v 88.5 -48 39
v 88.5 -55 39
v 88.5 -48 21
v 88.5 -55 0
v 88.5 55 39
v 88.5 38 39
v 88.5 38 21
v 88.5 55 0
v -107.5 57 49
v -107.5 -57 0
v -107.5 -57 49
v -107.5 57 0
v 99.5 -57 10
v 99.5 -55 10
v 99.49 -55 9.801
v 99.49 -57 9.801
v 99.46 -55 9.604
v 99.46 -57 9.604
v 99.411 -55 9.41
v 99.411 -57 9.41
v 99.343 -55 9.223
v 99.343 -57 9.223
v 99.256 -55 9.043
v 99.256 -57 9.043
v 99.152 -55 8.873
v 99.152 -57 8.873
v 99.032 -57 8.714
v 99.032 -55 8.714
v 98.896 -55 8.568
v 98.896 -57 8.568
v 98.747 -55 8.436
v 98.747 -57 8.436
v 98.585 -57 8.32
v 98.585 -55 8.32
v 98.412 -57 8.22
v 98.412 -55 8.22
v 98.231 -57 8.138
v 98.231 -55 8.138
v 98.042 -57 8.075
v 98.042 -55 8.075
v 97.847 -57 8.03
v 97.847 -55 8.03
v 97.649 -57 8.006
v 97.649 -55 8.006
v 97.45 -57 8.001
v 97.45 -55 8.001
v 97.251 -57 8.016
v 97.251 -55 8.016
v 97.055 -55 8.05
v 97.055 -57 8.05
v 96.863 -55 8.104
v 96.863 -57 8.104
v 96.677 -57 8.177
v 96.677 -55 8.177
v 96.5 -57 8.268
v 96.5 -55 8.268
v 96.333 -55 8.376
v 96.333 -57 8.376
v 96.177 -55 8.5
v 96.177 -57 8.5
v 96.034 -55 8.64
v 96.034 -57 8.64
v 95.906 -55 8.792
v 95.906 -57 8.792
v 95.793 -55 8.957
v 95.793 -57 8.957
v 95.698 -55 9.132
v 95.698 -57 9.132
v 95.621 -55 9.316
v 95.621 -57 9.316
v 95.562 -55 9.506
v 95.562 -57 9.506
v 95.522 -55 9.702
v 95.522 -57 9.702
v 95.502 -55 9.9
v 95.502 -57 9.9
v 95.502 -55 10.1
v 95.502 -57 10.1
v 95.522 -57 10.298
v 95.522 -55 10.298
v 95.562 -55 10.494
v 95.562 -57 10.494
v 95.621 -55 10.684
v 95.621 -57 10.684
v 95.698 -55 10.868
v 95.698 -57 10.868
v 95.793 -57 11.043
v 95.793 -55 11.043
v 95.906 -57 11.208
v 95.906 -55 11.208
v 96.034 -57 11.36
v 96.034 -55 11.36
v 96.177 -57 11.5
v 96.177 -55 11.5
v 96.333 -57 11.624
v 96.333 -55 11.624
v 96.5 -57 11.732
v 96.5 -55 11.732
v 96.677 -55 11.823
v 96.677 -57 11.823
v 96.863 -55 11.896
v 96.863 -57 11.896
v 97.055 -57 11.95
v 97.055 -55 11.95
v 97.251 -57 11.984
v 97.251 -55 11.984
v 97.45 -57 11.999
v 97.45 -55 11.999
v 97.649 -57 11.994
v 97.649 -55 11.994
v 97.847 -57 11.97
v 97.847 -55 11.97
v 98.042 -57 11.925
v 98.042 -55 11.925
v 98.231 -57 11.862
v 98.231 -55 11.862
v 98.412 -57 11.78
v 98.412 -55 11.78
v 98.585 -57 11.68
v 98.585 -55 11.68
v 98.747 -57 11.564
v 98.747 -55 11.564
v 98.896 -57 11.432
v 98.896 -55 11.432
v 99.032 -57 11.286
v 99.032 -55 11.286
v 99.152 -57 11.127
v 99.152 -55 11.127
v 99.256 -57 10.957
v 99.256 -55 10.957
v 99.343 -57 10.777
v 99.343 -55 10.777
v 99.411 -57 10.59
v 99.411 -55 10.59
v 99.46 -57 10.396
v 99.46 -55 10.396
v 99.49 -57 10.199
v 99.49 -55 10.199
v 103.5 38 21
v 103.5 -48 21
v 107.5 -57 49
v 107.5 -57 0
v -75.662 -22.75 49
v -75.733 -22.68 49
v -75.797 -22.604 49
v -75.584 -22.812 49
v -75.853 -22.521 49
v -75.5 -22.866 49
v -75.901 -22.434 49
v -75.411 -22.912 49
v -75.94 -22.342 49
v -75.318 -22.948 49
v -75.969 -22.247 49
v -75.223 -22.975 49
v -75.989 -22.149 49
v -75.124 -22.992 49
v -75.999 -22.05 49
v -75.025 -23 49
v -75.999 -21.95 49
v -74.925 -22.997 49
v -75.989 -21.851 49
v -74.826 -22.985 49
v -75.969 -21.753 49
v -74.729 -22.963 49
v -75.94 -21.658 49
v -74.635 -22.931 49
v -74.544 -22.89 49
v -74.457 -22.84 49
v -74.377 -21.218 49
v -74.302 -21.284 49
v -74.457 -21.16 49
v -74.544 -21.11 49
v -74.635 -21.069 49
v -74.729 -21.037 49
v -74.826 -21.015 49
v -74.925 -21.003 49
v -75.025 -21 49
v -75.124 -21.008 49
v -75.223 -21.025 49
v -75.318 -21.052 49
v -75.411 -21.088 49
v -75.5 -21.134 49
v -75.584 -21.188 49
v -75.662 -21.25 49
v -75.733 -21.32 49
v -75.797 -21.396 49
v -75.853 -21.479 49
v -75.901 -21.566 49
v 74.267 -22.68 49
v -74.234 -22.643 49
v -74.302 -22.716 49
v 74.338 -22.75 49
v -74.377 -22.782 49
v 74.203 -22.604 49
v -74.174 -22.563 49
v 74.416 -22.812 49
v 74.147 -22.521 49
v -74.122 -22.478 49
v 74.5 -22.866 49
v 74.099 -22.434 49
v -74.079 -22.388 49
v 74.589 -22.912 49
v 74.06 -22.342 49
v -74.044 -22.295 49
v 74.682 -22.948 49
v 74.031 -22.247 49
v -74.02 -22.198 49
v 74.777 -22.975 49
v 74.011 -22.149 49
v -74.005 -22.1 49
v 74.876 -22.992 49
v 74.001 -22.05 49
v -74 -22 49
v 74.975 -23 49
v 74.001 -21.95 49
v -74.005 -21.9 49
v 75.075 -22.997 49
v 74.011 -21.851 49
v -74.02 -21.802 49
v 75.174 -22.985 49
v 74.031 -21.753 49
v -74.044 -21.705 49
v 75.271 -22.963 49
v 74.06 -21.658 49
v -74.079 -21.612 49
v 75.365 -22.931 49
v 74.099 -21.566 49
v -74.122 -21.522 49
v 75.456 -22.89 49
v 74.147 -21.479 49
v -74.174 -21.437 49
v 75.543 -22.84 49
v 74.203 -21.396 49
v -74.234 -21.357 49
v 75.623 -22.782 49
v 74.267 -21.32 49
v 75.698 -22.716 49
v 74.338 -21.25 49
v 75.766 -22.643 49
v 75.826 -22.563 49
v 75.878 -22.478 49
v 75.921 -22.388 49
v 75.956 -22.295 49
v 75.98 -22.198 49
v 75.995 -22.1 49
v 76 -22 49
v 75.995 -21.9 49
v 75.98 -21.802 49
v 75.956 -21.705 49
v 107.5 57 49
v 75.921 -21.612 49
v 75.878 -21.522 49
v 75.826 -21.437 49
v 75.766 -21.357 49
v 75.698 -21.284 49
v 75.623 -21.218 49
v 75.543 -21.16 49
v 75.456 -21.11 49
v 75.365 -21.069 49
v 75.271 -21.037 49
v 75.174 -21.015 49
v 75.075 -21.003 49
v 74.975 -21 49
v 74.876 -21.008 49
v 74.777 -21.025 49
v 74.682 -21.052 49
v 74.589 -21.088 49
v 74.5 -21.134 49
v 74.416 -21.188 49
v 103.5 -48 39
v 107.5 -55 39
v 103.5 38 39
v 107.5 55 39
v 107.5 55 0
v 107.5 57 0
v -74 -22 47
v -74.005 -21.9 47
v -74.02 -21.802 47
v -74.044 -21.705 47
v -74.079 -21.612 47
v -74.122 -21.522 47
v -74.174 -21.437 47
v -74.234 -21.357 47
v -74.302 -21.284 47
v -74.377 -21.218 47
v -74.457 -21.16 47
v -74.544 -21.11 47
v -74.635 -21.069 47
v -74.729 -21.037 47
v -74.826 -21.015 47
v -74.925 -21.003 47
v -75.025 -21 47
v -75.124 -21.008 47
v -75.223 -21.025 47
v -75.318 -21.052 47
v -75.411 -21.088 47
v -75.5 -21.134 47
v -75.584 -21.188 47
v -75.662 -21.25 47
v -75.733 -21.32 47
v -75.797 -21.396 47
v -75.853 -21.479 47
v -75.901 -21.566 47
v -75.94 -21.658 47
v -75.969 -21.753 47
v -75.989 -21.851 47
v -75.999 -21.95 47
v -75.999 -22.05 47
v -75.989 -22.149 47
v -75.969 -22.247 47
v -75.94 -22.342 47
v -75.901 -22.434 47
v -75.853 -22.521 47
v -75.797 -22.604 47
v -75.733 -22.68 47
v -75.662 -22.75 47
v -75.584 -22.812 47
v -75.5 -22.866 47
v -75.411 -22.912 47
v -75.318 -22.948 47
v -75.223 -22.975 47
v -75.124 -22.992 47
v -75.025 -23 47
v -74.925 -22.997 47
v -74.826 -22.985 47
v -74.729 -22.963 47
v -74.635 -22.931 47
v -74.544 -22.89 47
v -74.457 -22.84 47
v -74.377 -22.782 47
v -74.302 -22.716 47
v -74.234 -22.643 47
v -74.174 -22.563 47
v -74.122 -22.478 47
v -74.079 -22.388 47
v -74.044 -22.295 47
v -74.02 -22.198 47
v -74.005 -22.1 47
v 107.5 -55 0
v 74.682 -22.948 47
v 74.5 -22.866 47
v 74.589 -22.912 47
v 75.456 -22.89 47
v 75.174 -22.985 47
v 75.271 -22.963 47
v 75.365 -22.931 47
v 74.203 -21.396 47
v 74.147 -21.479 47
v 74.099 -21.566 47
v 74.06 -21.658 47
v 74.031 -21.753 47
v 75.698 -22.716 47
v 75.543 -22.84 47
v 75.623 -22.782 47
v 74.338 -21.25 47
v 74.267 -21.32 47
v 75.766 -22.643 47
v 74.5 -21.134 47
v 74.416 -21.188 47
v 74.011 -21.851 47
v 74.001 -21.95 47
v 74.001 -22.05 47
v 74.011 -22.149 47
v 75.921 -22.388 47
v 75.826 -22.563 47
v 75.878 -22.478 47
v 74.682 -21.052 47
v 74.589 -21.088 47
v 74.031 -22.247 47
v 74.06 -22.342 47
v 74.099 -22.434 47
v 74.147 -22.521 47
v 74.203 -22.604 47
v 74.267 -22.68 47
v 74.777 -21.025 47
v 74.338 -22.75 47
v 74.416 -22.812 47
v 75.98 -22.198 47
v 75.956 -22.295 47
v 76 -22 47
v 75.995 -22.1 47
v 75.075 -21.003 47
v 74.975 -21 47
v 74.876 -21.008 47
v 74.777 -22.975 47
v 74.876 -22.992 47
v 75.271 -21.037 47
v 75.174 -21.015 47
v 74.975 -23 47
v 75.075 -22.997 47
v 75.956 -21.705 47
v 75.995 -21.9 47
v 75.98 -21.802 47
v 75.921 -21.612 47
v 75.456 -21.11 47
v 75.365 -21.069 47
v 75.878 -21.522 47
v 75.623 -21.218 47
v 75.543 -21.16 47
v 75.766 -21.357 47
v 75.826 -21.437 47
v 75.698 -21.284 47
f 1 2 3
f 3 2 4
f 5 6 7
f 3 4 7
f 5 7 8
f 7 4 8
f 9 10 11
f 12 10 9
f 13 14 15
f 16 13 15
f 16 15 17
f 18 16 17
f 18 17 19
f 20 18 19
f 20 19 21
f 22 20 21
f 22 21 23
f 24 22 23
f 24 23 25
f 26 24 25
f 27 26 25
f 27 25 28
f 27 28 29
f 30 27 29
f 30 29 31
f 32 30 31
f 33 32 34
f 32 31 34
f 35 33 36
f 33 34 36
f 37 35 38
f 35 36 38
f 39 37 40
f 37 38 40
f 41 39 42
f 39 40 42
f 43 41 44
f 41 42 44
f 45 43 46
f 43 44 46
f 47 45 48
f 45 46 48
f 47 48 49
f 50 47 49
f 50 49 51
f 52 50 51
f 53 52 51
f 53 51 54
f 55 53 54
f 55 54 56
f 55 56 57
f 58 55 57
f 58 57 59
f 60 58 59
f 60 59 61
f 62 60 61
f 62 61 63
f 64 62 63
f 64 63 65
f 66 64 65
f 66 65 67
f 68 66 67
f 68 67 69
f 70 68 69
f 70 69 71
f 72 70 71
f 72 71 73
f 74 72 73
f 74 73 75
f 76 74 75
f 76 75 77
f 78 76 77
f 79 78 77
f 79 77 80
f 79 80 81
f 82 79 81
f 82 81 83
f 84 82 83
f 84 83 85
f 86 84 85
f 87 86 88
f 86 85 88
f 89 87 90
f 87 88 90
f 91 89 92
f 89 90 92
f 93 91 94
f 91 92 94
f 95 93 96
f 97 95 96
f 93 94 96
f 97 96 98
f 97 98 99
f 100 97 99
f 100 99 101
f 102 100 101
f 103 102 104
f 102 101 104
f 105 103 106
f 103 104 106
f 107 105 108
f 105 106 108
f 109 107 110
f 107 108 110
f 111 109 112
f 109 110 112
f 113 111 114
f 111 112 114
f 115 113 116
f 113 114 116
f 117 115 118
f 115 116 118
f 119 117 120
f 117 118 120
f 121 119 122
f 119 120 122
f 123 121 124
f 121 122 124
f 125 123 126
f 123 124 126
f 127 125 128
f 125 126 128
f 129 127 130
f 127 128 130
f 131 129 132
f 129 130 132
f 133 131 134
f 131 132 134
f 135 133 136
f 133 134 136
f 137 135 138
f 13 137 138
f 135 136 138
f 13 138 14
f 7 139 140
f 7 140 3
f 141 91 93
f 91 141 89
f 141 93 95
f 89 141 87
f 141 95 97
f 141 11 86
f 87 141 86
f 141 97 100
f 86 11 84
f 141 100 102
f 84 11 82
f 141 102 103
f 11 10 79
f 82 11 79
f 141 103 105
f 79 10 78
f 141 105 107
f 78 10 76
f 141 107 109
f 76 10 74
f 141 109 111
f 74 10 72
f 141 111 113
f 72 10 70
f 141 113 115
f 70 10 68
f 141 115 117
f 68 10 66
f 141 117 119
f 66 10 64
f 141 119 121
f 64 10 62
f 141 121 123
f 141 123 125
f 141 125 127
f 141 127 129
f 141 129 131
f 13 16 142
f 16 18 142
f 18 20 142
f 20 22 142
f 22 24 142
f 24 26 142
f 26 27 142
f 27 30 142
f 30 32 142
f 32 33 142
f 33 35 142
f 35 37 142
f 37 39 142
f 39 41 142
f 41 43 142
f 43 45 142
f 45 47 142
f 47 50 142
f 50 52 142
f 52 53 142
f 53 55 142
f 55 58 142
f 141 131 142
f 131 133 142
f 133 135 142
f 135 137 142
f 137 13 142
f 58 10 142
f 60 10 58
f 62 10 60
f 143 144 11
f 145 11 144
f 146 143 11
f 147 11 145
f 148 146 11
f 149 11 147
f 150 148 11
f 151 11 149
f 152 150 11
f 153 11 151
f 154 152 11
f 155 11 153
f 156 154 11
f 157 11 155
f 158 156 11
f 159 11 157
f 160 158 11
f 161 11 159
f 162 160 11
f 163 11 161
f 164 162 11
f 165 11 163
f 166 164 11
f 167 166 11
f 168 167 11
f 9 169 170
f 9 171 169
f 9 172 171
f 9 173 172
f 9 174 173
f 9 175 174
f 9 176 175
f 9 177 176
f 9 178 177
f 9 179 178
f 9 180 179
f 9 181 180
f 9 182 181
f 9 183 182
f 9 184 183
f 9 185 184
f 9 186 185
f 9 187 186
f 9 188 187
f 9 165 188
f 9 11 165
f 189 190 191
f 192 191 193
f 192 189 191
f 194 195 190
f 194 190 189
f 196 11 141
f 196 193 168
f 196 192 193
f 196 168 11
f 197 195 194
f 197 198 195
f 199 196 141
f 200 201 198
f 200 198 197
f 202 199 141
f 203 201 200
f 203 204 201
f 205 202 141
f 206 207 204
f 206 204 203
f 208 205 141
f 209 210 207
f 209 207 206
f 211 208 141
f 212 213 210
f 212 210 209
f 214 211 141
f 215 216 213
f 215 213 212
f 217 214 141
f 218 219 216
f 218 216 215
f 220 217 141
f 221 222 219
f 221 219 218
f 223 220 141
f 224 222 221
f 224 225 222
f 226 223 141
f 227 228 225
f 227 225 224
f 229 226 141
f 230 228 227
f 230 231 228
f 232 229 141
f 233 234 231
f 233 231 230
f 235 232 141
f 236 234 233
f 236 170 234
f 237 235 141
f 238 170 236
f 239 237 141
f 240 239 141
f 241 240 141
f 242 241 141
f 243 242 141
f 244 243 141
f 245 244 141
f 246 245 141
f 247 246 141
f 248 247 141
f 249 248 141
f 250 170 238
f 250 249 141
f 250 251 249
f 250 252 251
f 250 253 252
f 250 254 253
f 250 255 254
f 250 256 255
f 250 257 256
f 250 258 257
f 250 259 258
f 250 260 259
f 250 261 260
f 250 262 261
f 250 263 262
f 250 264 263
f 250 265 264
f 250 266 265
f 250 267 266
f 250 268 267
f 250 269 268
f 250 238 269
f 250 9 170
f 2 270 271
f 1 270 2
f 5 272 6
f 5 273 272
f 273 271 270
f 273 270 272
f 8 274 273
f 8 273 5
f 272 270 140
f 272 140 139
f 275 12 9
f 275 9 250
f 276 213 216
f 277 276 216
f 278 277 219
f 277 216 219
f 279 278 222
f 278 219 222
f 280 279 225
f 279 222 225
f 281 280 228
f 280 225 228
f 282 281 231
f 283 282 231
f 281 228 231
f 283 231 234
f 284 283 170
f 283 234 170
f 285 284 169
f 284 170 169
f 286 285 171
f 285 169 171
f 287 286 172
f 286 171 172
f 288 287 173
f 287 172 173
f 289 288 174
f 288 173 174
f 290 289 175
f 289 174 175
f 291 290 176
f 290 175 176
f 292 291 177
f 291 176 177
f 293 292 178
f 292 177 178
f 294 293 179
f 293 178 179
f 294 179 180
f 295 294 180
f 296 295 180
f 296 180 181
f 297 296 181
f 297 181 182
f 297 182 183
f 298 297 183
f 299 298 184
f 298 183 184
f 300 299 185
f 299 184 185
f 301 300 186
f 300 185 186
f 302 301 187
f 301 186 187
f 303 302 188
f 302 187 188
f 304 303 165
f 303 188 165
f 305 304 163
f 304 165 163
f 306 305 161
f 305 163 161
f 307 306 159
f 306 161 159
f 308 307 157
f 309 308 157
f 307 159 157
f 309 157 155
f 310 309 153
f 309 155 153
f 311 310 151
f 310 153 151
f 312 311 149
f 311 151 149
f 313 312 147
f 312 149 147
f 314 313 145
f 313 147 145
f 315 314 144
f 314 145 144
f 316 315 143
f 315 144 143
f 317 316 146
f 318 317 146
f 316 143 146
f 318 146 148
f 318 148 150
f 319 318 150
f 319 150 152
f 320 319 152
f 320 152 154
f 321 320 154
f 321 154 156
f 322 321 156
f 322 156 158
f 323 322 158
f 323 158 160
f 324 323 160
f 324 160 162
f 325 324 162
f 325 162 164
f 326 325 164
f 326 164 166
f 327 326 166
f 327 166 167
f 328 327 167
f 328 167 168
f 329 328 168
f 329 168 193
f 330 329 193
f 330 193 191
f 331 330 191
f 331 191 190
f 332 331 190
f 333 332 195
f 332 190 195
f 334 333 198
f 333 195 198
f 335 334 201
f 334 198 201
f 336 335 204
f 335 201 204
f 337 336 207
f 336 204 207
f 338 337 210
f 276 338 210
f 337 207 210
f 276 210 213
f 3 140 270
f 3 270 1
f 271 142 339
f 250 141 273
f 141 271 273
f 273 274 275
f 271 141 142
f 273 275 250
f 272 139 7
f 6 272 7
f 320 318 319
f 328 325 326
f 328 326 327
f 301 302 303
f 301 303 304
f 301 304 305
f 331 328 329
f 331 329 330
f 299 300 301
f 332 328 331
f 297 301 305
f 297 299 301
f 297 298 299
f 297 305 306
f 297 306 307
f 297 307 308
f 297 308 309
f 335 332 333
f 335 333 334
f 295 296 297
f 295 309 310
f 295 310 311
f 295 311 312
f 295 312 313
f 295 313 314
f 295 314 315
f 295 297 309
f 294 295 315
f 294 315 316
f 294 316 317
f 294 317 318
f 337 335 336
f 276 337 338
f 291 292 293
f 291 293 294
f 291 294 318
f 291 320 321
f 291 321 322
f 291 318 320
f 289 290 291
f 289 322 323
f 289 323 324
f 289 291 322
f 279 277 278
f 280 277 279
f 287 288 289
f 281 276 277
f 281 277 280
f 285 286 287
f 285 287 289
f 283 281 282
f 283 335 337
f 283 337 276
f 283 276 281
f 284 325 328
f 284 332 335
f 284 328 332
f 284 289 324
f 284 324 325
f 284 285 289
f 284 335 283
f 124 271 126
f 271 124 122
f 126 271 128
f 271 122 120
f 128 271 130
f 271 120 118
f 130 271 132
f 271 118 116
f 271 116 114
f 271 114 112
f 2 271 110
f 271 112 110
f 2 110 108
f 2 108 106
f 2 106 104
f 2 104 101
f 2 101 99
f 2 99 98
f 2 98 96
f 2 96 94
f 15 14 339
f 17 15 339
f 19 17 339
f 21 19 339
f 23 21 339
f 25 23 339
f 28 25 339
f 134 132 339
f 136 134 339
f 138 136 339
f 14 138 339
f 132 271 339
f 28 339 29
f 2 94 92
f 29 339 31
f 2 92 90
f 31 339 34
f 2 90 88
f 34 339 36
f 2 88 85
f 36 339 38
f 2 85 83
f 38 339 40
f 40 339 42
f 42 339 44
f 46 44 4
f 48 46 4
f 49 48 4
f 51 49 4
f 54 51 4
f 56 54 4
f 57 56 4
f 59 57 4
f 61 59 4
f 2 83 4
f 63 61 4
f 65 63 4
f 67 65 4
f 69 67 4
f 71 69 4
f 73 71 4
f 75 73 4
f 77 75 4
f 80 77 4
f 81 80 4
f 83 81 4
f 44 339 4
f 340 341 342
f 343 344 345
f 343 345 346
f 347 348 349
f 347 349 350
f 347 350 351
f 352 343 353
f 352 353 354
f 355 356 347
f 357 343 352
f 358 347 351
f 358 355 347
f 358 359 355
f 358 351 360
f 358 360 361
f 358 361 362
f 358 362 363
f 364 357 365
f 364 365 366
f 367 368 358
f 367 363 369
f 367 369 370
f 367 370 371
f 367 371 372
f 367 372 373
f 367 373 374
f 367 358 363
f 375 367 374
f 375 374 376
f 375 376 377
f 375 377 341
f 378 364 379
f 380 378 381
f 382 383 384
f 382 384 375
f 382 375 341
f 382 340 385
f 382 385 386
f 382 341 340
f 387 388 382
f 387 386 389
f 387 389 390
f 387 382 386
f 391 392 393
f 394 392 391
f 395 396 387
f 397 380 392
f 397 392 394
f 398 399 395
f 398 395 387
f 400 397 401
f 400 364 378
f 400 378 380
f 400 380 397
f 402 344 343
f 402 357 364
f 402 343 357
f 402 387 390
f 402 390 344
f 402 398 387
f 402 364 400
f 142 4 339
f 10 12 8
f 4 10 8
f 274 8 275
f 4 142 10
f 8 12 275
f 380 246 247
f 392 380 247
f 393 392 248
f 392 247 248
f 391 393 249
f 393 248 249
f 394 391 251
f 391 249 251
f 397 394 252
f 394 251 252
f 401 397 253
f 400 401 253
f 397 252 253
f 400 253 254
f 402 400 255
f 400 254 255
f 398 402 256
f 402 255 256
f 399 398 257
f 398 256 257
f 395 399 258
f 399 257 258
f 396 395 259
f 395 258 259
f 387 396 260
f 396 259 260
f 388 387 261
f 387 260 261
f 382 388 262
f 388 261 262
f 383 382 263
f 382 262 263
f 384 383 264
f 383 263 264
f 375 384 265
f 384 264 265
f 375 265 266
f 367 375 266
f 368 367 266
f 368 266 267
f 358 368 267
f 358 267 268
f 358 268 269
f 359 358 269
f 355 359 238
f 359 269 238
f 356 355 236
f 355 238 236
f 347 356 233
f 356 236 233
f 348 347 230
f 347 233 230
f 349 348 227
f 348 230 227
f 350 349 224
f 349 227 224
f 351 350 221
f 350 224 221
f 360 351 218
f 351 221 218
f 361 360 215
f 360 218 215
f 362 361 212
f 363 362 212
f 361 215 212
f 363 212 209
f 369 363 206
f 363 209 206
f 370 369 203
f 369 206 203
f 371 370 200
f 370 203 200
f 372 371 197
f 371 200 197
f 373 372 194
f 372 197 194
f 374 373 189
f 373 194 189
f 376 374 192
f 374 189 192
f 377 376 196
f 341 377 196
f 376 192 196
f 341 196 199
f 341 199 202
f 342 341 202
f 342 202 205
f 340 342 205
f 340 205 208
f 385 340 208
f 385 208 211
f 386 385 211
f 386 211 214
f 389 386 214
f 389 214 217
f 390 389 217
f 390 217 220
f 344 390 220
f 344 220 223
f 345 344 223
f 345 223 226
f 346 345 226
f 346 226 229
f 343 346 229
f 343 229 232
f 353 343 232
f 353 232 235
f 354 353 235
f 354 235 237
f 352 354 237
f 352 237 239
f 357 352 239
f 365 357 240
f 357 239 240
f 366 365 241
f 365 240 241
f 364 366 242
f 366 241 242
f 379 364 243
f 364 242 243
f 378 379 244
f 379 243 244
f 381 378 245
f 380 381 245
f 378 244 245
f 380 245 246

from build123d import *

# Parameters (mm, degrees)
SKETCH1_W           = 215
SKETCH1_H           = 114
BOSS_EXTRUDE1_DEPTH = 49
SKETCH2_W           = 19
SKETCH2_H           = 110
CUT_EXTRUDE1_DEPTH  = 39
SKETCH3_W           = 15
SKETCH3_H           = 86
BOSS_EXTRUDE3_DEPTH = 18
SKETCH4_R           = 2
CUT_EXTRUDE2_DEPTH  = 8
SKETCH5_R           = 1
CUT_EXTRUDE3_DEPTH  = 2


with BuildPart() as part:
    # Sketch1 → Boss-Extrude1 (new body)
    with BuildSketch(Plane.XY):
        Rectangle(SKETCH1_W, SKETCH1_H)
    extrude(amount=BOSS_EXTRUDE1_DEPTH)

    # Sketch2 → Cut-Extrude1 (cut)
    with BuildSketch(Plane(origin=(0, 0, 0), x_dir=(-1, 0, 0), z_dir=(0, 0, -1))):
        with Locations((-98, 0)):
            Rectangle(SKETCH2_W, SKETCH2_H)
    extrude(amount=-CUT_EXTRUDE1_DEPTH, mode=Mode.SUBTRACT)

    # Sketch3 → Boss-Extrude3 (add)
    with BuildSketch(Plane(origin=(0, 0, 39), x_dir=(-1, 0, 0), z_dir=(0, 0, -1))):
        with Locations((-96, -5)):
            Rectangle(SKETCH3_W, SKETCH3_H)
    extrude(amount=BOSS_EXTRUDE3_DEPTH)

    # Sketch4 → Cut-Extrude2 (cut)
    with BuildSketch(Plane(origin=(0, -55, 0), x_dir=(1, 0, 0), z_dir=(0, 1, 0))):
        with Locations((97.5, -10)):
            Circle(SKETCH4_R)
    extrude(amount=-CUT_EXTRUDE2_DEPTH, mode=Mode.SUBTRACT)

    # Sketch5 → Cut-Extrude3 (cut)
    with BuildSketch(Plane.XY.offset(49)):
        with Locations((75, -22)):
            Circle(SKETCH5_R)
        with Locations((-75, -22)):
            Circle(SKETCH5_R)
    extrude(amount=-CUT_EXTRUDE3_DEPTH, mode=Mode.SUBTRACT)


solid = part.part
